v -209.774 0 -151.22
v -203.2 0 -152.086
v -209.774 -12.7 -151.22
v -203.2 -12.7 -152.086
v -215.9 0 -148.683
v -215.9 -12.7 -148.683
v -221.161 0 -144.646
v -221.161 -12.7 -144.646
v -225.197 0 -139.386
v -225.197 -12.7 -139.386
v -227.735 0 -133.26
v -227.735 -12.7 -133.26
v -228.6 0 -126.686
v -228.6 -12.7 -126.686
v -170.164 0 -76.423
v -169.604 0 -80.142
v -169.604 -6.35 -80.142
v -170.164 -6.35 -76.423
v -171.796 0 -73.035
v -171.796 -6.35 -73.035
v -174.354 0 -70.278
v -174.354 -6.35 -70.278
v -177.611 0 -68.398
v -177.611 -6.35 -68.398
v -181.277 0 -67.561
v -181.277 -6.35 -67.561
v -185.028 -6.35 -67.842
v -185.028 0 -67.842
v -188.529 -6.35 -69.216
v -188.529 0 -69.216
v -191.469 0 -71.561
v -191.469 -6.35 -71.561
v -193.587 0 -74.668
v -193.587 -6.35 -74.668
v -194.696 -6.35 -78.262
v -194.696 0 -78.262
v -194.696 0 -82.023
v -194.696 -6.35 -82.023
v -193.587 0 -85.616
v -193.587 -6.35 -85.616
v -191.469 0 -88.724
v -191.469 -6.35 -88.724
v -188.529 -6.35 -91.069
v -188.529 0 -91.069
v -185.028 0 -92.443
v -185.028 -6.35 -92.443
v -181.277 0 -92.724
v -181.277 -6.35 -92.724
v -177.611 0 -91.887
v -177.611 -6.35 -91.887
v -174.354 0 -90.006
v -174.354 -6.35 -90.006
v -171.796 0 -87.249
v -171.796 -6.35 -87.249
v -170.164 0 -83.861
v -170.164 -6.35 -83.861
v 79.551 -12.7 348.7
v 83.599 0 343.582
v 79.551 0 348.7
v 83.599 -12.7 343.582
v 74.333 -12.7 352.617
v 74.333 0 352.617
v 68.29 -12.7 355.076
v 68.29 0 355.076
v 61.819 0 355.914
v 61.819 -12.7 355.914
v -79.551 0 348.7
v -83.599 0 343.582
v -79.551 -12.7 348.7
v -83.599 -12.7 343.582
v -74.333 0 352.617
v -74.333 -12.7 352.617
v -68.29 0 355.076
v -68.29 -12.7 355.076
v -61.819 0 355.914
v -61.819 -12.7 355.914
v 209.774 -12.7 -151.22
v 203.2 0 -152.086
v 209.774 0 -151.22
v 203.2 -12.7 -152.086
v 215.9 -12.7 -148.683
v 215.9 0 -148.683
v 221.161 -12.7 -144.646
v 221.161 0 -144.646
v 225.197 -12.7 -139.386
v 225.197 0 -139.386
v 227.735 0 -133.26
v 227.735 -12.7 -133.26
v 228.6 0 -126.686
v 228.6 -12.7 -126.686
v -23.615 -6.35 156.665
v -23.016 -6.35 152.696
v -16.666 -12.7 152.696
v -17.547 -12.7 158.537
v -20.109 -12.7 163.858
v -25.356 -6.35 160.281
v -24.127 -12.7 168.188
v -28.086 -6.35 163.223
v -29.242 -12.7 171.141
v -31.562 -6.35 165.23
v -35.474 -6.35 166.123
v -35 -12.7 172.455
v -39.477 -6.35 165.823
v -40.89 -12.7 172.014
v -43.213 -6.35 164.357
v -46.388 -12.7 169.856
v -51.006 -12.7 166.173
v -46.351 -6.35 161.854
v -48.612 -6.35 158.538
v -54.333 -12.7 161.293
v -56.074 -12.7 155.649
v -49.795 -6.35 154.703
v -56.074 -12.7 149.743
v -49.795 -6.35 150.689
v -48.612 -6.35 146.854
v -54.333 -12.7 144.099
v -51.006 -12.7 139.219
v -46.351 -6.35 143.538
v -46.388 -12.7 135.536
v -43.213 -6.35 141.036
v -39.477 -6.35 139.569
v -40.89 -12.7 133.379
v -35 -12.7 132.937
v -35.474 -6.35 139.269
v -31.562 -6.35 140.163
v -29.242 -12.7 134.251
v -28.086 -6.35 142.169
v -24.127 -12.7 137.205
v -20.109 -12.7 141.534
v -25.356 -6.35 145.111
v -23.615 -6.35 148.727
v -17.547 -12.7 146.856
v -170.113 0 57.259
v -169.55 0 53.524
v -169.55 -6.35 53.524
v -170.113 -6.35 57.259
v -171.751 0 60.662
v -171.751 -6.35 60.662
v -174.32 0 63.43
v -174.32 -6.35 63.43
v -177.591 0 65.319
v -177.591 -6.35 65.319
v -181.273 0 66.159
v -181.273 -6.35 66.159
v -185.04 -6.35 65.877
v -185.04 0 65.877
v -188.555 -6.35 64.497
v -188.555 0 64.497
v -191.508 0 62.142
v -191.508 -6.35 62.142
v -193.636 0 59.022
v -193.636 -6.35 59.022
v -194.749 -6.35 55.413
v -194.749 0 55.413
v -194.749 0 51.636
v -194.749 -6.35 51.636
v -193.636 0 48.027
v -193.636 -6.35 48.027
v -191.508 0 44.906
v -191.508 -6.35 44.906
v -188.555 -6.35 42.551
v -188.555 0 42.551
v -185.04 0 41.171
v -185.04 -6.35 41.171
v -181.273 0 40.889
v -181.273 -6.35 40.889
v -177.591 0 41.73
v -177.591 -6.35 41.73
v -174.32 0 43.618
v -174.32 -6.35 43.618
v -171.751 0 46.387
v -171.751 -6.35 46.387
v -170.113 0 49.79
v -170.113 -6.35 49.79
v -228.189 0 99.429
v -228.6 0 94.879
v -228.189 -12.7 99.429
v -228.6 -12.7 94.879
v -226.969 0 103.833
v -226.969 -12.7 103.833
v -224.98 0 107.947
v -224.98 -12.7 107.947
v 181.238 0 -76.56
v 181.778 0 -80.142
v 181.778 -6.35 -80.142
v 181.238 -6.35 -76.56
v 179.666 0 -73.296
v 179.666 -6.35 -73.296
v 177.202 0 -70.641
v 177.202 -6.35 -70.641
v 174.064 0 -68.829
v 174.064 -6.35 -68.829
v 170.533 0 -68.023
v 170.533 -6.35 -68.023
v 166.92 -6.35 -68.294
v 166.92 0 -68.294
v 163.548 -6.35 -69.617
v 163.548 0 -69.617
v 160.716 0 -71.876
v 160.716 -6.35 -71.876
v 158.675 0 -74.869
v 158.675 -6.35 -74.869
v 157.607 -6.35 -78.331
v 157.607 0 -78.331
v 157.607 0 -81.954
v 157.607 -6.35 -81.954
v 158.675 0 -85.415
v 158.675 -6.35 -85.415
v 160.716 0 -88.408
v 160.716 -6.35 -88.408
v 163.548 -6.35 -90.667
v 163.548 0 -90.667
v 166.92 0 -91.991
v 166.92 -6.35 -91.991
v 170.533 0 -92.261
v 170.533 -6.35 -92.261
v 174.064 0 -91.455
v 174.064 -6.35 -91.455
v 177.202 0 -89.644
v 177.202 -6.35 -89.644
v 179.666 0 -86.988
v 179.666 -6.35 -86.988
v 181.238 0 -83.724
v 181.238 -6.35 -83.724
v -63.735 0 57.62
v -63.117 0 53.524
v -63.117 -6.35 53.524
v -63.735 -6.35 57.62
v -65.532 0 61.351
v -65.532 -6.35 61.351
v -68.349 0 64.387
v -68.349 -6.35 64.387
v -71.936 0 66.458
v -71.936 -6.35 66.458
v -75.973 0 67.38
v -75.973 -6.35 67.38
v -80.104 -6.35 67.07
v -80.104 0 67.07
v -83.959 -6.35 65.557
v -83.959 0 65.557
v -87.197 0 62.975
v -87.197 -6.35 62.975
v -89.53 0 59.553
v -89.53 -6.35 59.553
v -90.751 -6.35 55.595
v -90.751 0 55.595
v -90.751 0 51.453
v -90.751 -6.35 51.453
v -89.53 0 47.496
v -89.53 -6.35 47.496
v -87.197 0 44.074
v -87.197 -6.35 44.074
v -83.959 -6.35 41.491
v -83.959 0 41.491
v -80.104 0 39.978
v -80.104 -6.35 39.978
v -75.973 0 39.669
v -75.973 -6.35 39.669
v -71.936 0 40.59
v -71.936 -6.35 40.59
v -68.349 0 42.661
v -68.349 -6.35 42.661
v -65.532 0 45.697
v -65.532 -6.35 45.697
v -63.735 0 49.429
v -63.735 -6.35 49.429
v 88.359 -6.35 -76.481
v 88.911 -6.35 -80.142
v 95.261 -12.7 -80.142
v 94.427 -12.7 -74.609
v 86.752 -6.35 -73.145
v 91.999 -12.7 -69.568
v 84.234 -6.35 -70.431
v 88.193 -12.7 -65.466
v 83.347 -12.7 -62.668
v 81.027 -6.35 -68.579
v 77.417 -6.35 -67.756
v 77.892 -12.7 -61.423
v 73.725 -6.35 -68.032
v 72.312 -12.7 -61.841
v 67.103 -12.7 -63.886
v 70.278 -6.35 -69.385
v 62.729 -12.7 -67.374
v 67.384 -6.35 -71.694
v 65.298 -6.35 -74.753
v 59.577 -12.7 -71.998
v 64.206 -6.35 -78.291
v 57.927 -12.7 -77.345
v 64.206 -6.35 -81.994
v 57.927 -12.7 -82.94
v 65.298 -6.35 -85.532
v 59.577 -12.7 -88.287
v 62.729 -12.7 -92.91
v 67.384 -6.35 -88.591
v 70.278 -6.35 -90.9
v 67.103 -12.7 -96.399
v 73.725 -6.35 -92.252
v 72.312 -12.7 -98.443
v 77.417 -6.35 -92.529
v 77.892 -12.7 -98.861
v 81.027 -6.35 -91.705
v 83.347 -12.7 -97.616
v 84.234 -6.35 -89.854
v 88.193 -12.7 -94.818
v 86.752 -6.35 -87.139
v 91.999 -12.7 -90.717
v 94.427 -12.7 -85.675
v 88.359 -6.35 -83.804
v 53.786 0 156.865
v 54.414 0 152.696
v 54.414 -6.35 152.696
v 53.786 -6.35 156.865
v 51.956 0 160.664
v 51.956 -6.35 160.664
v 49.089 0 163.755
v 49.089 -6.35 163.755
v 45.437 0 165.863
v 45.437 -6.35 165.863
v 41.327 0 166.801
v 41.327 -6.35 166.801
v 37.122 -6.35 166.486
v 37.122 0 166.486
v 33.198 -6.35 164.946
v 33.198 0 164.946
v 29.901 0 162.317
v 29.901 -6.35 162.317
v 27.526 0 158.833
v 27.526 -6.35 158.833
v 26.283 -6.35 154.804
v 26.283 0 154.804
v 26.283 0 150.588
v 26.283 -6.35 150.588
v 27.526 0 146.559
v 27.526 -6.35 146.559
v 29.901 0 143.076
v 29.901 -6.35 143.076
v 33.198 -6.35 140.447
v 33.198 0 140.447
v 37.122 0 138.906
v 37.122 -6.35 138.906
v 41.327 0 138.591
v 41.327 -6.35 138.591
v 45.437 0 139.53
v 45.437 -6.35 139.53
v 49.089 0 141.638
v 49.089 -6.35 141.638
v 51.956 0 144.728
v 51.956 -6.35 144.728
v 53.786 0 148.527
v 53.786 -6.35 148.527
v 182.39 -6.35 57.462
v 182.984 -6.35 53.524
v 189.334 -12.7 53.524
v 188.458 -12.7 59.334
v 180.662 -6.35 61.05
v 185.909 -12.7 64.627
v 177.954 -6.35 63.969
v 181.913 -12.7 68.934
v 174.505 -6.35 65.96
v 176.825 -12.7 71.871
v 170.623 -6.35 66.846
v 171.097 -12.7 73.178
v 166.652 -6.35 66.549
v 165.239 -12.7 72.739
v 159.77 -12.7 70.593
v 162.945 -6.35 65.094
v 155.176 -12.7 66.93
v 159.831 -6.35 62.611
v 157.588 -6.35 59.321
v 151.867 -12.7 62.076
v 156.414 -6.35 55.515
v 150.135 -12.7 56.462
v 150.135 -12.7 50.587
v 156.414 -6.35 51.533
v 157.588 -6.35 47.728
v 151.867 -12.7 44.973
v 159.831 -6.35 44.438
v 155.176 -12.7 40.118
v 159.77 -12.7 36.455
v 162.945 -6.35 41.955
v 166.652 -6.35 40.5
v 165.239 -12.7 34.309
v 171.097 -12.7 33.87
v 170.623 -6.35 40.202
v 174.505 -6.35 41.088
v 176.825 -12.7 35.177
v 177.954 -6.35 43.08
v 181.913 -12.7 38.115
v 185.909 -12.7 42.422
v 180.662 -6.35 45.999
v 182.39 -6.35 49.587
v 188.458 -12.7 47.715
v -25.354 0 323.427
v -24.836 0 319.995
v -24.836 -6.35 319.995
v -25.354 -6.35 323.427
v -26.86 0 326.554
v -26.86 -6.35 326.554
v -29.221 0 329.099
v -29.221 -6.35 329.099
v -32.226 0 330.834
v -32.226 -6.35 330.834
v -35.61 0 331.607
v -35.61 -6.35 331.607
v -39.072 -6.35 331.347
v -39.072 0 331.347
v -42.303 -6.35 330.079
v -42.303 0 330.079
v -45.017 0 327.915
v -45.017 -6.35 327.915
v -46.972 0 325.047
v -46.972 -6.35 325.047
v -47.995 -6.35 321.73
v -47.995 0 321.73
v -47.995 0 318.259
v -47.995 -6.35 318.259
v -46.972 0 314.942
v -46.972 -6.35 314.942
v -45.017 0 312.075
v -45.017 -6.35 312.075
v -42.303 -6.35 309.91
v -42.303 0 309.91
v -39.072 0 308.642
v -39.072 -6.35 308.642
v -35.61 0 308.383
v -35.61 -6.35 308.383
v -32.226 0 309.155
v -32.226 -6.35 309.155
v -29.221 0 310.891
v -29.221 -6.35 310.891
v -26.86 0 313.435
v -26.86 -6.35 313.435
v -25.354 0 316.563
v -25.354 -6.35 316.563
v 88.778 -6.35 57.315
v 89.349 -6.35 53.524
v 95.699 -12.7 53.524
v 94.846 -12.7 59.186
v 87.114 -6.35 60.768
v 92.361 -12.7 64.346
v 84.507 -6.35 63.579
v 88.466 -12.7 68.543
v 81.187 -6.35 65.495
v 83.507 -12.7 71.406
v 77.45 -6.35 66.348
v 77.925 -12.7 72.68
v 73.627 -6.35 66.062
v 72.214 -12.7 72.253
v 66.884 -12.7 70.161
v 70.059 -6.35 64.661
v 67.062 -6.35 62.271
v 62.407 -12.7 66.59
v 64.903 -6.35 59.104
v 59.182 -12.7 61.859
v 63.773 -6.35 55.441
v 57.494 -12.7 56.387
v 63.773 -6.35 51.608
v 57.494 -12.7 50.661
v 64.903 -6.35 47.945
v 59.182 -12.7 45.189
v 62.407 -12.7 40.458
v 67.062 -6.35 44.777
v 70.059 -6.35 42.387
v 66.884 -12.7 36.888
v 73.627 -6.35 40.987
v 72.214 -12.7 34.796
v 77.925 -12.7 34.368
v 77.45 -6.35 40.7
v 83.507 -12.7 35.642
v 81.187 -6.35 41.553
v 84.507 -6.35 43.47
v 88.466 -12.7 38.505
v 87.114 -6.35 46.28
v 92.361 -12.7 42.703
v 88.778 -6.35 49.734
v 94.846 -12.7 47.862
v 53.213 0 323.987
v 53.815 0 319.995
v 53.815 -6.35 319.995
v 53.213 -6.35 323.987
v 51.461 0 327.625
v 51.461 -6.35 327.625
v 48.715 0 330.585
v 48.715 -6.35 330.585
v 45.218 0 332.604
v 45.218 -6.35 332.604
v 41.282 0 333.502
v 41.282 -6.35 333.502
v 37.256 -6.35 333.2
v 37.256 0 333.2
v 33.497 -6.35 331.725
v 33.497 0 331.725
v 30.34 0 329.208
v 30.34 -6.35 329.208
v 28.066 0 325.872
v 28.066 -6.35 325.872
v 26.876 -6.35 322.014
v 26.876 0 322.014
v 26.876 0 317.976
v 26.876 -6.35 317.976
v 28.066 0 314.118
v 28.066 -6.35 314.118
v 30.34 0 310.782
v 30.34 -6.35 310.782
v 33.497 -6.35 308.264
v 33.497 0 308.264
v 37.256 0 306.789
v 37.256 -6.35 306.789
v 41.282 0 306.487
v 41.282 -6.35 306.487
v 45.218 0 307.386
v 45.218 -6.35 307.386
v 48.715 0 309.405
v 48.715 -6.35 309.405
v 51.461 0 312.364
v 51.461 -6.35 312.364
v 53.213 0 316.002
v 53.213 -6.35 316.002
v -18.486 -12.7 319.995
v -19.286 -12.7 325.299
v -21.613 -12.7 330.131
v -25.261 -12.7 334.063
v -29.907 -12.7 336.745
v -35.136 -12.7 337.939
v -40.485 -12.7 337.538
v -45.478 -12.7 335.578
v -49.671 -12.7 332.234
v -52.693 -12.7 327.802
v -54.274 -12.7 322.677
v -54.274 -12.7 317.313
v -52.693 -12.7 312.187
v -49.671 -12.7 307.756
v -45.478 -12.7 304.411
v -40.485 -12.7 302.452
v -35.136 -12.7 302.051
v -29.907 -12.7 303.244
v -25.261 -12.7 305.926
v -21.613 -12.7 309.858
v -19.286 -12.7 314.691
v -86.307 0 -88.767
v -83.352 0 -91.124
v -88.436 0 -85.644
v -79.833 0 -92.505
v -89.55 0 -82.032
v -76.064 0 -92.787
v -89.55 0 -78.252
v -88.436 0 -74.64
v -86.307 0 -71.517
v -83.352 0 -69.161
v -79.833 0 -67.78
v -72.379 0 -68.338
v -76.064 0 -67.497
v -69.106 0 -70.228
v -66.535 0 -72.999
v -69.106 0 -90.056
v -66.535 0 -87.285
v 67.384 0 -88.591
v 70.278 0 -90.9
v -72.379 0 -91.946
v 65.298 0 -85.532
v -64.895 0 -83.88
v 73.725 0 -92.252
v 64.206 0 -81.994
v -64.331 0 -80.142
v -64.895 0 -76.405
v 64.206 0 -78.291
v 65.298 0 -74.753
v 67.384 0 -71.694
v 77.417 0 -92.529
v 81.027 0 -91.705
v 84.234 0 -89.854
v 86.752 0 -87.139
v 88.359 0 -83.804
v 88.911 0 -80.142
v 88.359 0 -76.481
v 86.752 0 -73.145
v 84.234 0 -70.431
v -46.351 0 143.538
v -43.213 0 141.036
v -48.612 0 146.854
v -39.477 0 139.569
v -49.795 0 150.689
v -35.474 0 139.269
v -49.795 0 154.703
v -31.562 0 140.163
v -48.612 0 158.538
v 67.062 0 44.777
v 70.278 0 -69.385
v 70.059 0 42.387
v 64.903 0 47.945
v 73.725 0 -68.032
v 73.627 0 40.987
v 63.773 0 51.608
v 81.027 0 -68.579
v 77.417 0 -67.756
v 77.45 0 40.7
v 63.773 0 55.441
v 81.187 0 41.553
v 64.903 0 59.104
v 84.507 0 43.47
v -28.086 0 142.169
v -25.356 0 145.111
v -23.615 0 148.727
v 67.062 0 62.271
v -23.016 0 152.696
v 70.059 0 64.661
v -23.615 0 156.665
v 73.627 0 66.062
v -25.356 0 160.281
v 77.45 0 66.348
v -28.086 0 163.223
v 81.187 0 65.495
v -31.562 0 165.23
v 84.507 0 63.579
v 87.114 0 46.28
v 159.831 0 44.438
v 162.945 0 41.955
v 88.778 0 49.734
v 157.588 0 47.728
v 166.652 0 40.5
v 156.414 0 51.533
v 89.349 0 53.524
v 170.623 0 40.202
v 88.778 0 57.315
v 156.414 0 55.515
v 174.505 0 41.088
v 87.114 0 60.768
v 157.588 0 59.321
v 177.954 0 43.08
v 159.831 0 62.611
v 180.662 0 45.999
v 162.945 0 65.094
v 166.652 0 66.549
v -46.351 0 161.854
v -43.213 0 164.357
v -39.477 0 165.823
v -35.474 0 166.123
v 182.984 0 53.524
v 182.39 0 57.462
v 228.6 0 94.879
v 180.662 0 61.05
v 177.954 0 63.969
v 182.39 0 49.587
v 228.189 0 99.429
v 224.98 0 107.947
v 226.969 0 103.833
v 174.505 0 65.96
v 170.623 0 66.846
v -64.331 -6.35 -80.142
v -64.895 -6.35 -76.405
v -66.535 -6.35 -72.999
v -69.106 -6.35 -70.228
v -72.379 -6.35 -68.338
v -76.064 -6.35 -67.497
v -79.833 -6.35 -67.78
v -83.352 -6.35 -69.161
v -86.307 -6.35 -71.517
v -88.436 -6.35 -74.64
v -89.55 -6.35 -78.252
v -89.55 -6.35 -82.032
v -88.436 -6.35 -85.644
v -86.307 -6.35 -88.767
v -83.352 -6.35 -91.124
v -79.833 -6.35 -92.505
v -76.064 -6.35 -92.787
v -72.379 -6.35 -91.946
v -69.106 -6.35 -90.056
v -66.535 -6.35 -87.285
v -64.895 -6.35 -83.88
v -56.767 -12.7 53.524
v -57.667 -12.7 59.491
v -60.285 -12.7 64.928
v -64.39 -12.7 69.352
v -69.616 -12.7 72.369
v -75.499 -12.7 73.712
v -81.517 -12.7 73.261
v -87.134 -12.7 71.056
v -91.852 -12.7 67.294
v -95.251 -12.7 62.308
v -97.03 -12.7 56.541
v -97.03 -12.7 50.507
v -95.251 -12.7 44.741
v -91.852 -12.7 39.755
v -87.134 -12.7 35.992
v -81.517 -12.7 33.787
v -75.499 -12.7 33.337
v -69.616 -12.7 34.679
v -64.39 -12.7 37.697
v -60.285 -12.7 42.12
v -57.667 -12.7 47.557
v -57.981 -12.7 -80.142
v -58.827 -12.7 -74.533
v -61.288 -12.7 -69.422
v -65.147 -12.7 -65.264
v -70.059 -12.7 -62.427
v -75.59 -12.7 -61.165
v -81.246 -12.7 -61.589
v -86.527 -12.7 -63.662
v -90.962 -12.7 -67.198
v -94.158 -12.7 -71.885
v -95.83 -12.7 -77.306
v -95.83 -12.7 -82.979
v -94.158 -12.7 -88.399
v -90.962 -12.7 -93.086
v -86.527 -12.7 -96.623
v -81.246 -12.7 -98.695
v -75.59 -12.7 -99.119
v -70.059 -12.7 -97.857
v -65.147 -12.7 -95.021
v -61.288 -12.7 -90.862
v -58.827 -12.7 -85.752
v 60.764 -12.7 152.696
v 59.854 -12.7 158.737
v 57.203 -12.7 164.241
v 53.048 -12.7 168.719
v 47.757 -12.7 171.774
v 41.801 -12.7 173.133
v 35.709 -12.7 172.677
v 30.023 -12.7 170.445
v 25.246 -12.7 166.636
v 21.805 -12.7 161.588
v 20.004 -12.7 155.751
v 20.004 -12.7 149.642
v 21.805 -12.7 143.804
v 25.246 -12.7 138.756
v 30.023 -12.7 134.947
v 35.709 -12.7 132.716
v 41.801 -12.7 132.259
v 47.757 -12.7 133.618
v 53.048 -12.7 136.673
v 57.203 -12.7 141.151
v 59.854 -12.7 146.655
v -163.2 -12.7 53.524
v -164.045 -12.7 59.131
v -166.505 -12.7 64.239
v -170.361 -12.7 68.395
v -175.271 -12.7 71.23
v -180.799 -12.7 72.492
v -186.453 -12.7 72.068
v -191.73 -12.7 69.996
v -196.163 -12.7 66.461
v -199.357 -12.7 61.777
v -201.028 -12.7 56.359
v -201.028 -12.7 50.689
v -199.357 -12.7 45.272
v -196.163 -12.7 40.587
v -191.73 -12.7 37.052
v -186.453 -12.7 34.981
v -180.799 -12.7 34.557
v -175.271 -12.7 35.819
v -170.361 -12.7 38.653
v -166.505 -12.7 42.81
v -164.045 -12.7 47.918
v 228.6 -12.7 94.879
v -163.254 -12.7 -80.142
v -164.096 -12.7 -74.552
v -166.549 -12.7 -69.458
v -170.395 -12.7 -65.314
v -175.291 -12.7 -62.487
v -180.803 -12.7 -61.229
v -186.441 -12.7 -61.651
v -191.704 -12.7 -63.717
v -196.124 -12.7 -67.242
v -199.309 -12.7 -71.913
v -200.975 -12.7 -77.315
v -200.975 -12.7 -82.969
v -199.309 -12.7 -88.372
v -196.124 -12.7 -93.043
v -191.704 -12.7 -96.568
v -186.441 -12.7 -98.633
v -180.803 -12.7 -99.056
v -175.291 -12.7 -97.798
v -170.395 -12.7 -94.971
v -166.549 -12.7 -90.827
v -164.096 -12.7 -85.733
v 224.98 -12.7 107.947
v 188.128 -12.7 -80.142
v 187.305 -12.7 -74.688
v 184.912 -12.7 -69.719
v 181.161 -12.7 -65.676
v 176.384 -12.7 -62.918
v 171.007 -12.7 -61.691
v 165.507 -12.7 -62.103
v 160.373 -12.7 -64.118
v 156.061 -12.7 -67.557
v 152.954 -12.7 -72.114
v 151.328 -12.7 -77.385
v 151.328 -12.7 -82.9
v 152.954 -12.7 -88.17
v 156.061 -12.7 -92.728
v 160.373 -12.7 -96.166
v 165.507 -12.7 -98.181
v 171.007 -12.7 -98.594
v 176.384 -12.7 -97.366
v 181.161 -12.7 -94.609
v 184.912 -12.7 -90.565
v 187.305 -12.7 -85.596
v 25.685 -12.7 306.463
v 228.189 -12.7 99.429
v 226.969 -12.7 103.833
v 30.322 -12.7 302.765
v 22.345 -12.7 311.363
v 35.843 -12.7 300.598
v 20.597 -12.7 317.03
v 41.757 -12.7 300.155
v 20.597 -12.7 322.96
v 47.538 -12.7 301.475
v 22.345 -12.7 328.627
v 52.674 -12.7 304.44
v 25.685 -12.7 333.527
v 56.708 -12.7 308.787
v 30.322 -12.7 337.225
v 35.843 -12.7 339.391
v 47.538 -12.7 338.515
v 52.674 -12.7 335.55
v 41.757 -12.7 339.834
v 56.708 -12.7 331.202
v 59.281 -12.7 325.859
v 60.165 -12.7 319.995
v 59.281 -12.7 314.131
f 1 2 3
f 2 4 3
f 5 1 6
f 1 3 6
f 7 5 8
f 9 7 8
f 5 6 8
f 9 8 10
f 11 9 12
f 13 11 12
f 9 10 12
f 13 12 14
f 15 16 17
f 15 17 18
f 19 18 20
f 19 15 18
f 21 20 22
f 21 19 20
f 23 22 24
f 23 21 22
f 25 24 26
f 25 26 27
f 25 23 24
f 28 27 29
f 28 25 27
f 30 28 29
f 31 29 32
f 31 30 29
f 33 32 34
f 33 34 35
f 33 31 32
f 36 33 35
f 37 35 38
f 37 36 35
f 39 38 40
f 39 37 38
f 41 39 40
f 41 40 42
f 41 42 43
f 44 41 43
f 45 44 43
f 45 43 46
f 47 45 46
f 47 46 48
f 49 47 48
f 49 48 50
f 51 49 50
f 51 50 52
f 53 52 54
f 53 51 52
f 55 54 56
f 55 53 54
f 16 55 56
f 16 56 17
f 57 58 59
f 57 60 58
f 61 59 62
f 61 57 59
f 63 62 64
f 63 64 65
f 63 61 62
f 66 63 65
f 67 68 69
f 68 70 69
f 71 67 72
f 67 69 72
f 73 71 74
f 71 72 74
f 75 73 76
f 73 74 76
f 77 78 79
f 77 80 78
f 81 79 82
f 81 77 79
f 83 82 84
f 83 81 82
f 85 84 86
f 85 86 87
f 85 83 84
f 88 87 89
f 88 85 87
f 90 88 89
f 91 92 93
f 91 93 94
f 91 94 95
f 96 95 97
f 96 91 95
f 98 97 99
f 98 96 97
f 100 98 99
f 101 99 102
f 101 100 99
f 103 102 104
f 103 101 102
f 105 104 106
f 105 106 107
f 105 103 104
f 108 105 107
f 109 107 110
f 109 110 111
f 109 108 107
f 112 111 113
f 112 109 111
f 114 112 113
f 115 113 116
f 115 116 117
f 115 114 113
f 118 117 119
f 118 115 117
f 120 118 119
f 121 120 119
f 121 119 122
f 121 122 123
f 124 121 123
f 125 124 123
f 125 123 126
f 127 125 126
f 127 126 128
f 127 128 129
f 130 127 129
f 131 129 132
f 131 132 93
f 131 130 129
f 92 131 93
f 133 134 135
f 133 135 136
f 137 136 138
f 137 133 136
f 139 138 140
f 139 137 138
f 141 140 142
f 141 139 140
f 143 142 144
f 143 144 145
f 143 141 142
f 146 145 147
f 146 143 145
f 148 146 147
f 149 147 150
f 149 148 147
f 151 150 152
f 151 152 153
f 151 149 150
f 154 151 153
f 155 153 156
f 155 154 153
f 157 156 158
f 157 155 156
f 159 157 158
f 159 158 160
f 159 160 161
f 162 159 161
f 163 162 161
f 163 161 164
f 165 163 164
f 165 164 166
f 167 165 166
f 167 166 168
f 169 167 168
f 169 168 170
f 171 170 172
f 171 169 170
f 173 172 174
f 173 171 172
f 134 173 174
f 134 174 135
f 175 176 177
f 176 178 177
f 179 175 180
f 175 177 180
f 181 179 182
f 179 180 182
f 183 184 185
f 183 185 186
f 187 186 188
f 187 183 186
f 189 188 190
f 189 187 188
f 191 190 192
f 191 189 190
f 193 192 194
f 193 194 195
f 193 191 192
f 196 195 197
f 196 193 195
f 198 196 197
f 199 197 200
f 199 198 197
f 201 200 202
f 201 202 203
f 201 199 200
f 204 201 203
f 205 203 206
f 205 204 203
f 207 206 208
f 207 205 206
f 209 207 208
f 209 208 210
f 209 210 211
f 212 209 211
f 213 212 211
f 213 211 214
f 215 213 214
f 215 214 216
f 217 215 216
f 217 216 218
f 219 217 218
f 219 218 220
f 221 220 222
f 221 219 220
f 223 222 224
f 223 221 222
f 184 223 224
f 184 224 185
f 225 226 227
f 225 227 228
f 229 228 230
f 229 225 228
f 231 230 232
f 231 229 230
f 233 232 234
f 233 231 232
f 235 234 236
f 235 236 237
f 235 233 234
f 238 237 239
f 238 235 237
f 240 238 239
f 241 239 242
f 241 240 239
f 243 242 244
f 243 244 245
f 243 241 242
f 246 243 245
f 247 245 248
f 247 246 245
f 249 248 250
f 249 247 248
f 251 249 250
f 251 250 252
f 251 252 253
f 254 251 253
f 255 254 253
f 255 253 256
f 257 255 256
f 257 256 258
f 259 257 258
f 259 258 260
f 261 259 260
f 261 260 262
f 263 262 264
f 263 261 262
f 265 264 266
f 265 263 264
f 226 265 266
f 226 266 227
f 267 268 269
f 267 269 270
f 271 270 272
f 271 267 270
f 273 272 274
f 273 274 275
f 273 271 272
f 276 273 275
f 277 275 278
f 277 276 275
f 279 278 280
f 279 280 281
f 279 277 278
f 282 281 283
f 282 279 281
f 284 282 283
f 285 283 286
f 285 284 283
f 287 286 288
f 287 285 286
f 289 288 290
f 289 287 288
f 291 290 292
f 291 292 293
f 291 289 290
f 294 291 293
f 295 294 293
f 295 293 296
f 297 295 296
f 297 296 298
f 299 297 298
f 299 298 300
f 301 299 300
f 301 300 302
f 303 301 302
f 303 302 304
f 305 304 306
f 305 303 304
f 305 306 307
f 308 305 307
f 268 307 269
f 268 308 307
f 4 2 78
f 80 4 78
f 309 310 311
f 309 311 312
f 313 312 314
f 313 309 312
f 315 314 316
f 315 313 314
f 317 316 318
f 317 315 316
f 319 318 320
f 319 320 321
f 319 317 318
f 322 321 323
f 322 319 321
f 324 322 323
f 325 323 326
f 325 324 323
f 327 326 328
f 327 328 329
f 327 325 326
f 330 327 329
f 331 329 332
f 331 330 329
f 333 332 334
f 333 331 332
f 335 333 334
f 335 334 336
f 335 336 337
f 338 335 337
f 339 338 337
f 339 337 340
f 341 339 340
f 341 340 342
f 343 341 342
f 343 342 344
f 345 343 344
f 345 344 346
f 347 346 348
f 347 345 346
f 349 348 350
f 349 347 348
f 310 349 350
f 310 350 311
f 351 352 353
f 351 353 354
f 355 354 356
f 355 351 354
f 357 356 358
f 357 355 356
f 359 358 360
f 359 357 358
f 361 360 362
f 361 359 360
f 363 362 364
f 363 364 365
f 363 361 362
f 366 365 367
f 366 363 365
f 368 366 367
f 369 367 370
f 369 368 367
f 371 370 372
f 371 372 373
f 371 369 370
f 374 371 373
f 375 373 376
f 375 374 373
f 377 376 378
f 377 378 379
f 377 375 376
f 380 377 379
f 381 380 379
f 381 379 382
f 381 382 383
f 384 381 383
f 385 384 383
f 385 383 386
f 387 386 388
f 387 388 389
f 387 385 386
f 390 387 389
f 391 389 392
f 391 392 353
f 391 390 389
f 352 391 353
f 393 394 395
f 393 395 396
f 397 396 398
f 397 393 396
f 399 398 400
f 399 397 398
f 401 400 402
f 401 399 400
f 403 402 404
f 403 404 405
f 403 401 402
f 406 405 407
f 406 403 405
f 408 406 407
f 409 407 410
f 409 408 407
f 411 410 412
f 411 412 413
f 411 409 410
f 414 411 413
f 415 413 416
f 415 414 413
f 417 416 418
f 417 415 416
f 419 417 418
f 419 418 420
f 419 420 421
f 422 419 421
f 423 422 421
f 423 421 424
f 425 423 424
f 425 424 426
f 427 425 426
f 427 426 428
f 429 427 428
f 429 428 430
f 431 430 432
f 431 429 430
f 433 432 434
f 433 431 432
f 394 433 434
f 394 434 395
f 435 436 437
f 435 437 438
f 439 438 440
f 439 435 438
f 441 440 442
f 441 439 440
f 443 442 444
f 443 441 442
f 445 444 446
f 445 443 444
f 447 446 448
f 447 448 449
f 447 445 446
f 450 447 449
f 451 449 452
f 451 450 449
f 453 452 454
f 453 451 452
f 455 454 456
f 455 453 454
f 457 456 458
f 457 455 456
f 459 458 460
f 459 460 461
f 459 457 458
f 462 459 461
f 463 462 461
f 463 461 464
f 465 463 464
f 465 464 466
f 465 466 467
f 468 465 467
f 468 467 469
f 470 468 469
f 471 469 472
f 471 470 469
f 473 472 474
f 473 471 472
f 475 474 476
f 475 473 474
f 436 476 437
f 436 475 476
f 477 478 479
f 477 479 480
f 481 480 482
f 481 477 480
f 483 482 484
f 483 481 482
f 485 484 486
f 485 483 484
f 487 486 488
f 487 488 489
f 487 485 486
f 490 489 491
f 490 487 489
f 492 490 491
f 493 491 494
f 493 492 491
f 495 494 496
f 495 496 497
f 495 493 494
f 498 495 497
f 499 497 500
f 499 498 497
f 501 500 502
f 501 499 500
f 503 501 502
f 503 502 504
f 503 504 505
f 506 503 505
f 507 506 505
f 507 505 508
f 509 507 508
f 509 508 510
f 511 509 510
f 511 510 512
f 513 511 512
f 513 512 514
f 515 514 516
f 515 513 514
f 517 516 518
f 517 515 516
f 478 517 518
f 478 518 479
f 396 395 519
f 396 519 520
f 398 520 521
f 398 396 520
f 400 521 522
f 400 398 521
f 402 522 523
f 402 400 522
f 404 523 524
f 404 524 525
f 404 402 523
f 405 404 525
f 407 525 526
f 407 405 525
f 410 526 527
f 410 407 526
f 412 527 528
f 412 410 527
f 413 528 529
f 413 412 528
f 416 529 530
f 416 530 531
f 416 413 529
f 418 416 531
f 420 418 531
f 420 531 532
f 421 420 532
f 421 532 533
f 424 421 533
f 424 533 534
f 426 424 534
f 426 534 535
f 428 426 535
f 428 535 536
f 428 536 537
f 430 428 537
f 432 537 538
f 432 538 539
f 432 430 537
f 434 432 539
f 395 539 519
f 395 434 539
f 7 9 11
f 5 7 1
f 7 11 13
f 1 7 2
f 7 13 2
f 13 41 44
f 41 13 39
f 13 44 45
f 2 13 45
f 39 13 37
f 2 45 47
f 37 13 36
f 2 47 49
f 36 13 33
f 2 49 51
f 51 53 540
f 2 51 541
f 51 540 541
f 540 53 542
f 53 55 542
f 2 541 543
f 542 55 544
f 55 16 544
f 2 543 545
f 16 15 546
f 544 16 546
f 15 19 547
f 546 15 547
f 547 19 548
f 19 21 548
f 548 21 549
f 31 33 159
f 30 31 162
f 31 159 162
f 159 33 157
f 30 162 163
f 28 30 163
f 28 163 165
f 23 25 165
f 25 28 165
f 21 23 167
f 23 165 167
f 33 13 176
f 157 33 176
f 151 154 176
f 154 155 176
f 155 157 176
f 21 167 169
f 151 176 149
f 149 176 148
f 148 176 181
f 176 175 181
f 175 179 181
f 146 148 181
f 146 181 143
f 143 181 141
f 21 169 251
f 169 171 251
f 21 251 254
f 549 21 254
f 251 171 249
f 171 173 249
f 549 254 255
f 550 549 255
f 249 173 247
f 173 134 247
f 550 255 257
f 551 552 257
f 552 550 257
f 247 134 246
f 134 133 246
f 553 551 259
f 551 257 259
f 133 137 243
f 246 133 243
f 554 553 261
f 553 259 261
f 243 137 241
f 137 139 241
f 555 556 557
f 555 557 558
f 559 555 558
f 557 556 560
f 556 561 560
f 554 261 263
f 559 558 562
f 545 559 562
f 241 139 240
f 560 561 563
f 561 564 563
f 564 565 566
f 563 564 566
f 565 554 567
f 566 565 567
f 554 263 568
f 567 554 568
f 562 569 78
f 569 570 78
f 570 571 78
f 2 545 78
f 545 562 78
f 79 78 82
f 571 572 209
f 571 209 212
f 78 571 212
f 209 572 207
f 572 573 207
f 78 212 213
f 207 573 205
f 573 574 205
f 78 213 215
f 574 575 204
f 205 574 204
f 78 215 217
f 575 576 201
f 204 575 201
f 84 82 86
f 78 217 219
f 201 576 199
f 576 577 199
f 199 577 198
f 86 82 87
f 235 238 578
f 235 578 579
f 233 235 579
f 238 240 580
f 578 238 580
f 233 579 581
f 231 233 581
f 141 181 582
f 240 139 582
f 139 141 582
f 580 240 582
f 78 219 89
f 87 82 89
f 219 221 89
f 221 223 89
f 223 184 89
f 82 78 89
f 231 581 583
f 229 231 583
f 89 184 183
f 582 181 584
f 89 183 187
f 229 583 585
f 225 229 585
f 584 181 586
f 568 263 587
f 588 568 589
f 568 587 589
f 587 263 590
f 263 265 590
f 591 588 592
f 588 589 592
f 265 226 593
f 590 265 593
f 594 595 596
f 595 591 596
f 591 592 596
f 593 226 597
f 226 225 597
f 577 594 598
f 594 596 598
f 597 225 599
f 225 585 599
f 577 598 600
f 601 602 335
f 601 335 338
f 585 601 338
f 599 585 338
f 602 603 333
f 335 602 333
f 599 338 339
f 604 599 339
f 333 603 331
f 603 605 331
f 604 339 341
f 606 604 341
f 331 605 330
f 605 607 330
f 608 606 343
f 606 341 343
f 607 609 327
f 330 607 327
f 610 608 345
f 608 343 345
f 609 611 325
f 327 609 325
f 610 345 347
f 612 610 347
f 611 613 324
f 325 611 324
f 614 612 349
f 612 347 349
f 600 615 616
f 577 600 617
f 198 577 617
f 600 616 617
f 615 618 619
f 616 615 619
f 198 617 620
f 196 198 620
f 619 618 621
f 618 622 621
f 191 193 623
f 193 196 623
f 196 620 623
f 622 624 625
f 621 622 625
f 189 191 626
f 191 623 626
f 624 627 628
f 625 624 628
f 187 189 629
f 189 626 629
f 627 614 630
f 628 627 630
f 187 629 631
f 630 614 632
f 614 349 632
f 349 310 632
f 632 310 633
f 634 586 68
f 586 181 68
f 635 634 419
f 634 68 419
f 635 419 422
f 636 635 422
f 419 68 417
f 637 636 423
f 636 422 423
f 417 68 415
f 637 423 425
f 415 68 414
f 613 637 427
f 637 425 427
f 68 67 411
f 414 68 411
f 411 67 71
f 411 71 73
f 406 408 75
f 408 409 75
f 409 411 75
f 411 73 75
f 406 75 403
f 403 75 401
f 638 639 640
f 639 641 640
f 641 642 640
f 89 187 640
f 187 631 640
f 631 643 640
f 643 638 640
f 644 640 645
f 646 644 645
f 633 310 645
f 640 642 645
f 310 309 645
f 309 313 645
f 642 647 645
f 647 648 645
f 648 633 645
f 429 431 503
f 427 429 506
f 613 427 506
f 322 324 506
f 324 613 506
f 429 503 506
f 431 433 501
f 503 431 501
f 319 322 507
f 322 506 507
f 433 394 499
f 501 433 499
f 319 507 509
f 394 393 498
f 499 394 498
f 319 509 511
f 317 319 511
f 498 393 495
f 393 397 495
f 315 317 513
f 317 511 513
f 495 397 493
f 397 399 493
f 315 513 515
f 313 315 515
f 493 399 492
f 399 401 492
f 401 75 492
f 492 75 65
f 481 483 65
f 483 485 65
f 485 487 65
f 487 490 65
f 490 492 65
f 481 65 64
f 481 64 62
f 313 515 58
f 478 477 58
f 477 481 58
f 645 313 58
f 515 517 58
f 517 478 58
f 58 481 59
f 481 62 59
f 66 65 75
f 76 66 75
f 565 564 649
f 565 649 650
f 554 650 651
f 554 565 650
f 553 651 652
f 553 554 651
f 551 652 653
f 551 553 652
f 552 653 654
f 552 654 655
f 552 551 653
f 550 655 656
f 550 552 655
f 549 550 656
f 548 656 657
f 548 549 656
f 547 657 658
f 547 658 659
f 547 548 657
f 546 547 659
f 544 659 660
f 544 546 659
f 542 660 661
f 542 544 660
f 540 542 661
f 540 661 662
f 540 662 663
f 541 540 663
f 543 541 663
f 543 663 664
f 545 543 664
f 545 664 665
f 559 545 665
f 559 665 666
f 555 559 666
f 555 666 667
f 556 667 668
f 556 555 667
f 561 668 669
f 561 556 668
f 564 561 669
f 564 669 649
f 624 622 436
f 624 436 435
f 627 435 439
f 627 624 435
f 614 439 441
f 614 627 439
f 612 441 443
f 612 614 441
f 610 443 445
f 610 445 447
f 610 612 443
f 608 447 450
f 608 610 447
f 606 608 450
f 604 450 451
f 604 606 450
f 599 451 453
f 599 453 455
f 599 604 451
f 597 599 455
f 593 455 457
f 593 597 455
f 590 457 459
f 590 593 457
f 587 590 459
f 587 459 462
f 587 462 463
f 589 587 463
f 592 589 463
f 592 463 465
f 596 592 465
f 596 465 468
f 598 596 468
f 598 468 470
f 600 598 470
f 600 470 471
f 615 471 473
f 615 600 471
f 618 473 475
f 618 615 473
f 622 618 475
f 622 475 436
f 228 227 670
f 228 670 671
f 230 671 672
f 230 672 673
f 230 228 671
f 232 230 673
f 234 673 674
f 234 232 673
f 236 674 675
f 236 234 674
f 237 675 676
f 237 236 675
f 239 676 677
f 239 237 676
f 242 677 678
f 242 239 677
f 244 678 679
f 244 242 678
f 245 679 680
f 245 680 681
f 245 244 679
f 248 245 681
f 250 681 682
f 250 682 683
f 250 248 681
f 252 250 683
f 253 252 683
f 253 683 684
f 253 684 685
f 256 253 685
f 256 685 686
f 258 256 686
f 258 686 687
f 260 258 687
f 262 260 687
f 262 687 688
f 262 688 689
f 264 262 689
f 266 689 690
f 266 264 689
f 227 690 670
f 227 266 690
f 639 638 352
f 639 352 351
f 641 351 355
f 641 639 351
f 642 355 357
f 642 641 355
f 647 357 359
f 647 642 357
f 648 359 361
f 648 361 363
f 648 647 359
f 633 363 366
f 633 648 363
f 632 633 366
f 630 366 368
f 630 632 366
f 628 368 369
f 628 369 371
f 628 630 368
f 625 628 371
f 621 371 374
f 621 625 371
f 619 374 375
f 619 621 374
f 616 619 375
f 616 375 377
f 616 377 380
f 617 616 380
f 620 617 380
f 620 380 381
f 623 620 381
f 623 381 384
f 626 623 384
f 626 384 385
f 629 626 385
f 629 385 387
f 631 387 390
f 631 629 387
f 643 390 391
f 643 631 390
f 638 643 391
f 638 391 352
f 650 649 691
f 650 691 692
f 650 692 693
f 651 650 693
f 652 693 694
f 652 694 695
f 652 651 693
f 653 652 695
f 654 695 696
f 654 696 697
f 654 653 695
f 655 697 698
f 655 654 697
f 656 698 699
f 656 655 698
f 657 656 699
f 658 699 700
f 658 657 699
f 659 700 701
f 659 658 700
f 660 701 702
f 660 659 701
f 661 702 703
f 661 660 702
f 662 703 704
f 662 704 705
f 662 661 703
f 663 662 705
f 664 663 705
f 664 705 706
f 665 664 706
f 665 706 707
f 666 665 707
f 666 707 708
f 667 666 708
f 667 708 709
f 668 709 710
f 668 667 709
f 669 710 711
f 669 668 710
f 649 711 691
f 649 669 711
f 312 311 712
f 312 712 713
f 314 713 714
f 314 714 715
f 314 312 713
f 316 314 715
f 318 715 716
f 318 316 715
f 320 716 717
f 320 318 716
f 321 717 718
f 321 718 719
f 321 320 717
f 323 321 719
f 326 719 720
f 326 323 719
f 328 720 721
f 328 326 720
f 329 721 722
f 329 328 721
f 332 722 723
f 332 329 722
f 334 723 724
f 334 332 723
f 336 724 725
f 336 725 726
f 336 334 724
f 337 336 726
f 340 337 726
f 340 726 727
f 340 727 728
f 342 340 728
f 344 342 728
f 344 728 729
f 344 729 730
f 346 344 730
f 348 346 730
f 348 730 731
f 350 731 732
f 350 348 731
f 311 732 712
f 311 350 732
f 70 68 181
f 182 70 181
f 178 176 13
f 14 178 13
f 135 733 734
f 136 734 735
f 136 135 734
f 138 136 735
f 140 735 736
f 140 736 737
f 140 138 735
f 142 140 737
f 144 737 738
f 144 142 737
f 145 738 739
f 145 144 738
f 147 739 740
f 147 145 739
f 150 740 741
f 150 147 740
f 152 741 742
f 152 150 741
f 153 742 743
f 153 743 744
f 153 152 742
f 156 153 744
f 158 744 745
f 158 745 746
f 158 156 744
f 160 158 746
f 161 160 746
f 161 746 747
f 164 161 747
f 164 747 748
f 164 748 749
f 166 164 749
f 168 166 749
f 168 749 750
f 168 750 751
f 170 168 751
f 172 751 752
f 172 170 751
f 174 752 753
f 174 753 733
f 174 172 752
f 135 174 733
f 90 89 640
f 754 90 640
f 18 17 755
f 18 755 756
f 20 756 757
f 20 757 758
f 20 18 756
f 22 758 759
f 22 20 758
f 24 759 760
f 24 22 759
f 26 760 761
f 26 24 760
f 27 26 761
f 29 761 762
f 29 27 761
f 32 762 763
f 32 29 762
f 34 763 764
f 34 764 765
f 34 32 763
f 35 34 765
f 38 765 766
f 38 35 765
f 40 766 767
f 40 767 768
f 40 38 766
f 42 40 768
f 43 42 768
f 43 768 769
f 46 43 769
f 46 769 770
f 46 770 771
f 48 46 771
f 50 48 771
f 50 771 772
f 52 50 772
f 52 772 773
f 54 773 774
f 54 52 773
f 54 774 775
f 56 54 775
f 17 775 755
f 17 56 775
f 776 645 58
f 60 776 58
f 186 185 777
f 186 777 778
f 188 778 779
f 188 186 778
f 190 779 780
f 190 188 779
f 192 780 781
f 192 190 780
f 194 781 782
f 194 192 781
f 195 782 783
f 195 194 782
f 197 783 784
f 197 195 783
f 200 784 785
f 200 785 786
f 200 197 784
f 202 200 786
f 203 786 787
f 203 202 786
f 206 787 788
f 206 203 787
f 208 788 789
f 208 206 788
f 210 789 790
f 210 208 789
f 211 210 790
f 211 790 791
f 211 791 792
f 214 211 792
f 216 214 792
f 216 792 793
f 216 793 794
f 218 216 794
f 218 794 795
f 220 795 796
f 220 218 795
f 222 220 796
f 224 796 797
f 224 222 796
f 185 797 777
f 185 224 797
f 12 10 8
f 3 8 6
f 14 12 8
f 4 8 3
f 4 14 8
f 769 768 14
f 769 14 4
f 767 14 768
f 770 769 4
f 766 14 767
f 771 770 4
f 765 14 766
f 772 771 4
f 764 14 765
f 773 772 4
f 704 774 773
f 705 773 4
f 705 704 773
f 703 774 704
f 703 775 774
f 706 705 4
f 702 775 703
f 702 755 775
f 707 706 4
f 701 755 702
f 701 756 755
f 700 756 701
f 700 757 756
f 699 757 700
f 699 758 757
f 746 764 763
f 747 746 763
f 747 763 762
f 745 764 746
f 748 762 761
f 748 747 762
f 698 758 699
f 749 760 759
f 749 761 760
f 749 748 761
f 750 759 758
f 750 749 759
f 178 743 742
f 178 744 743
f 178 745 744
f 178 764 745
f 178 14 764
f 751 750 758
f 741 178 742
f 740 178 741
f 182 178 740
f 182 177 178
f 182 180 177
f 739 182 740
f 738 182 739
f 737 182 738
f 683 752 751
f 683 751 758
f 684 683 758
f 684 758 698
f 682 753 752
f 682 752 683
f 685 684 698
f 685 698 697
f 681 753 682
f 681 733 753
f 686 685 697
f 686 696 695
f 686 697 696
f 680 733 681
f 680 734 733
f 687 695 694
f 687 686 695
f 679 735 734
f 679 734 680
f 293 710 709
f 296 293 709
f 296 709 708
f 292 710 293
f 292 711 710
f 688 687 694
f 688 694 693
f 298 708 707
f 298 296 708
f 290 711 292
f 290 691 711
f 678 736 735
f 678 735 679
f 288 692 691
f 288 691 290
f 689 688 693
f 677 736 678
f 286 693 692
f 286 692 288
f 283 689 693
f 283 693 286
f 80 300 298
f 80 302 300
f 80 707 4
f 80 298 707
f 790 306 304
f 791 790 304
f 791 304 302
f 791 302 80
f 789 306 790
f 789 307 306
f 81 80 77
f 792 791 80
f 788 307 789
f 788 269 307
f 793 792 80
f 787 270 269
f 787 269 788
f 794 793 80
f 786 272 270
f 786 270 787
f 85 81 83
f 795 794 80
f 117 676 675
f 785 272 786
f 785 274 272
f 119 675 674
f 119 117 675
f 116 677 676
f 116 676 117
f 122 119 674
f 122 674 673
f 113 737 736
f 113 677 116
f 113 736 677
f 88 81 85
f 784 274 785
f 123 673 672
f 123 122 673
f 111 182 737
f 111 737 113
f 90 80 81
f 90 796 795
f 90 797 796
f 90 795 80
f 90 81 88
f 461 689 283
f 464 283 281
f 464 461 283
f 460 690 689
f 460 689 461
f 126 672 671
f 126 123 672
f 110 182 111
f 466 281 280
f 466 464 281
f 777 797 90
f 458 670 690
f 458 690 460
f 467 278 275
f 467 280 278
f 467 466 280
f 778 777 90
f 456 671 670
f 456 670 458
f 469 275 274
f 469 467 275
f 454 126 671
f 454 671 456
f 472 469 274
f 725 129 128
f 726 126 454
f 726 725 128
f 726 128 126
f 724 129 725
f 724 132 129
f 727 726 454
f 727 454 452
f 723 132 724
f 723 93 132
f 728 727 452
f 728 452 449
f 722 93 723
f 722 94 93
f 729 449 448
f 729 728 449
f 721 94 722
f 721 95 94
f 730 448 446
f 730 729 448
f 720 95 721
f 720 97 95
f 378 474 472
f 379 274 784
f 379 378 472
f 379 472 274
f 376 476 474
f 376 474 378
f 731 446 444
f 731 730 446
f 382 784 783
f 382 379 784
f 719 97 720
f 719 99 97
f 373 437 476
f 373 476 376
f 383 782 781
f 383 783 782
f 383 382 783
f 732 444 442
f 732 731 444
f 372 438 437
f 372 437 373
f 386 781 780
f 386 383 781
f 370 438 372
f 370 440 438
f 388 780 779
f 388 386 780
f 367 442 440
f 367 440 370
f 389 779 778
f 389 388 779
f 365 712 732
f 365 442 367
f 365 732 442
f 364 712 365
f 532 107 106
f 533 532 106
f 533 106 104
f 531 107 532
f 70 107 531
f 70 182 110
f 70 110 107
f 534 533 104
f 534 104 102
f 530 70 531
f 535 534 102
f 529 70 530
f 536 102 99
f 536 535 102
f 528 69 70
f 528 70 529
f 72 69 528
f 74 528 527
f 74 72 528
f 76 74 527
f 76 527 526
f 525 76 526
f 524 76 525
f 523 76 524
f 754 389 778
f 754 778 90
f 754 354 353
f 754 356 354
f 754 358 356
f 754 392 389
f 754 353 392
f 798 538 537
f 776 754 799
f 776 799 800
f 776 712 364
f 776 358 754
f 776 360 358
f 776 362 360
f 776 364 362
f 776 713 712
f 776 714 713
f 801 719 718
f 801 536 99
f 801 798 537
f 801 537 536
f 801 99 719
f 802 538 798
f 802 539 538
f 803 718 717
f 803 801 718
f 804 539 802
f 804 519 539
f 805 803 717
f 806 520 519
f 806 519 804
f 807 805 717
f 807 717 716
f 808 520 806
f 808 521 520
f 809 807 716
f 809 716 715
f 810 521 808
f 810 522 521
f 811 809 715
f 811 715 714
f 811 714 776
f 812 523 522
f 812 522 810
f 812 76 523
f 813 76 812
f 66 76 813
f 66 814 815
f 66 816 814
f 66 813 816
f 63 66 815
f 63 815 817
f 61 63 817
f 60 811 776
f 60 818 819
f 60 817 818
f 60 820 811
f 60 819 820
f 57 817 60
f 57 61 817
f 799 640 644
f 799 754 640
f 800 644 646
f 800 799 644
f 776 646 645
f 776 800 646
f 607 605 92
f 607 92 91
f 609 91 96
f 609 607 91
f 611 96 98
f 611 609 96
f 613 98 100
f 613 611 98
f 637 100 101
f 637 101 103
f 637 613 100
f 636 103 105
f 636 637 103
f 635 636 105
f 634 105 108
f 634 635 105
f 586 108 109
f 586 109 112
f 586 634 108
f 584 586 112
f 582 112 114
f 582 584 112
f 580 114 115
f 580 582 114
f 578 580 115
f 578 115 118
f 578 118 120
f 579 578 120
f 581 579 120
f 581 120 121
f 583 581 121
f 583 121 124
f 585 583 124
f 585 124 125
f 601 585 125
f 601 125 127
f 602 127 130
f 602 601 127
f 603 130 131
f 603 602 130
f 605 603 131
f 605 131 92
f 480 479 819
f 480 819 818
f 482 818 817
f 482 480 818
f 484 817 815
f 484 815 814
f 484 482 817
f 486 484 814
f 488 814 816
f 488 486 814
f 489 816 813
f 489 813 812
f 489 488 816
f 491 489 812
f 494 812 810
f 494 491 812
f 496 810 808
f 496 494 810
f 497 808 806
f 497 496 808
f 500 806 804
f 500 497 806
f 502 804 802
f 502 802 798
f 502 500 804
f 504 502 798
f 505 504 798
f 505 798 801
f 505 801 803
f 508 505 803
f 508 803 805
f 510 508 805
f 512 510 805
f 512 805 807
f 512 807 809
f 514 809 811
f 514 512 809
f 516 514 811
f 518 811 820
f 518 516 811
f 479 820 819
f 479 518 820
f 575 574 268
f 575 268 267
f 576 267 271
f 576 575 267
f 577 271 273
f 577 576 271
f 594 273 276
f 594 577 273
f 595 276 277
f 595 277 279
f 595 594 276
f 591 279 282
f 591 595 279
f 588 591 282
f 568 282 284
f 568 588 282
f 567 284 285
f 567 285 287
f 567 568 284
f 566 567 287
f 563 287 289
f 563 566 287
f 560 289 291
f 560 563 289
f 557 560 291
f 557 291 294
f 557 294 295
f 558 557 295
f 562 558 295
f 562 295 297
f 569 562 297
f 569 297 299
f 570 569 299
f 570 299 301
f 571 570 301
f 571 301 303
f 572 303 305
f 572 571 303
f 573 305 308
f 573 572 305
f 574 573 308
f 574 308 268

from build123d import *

# Parameters (mm, degrees)
F0_R     = 12.6166
F0_R_2   = 12.680328
F0_R_3   = 12.670482
F0_R_4   = 13.894295
F0_R_5   = 12.421427
F0_R_6   = 12.153085
F0_R_7   = 12.859931
F0_R_8   = 13.359293
F0_R_9   = 13.464332
F0_R_10  = 11.644387
F0_R_11  = 14.14438
F0_R_12  = 13.545297
F1_DEPTH = 12.7
F2_R     = 25.4
F3_SIZE  = 6.35


with BuildPart() as f1:
    # F0 (on Front) → F1 (new body)
    with BuildSketch(Plane.XZ):
        Polygon((-228.6, -152.085962), (228.6, -152.085962), (228.6, 101.914038), (76.2, 355.914038), (-76.2, 355.914038), (-228.6, 101.914038), align=None)
        with Locations((-182.22025, -80.14226)):
            Circle(F0_R, mode=Mode.SUBTRACT)
        with Locations((-77.011786, -80.14226)):
            Circle(F0_R_2, mode=Mode.SUBTRACT)
        with Locations((-182.22025, 53.524222)):
            Circle(F0_R_3, mode=Mode.SUBTRACT)
        with Locations((-77.011786, 53.524222)):
            Circle(F0_R_4, mode=Mode.SUBTRACT)
        with Locations((76.489076, -80.14226)):
            Circle(F0_R_5, mode=Mode.SUBTRACT)
        with Locations((169.624433, -80.14226)):
            Circle(F0_R_6, mode=Mode.SUBTRACT)
        with Locations((76.489076, 53.524222)):
            Circle(F0_R_7, mode=Mode.SUBTRACT)
        with Locations((169.624433, 53.524222)):
            Circle(F0_R_8, mode=Mode.SUBTRACT)
        with Locations((-36.480658, 152.696133)):
            Circle(F0_R_9, mode=Mode.SUBTRACT)
        with Locations((-36.480658, 319.994807)):
            Circle(F0_R_10, mode=Mode.SUBTRACT)
        with Locations((40.269773, 152.696133)):
            Circle(F0_R_11, mode=Mode.SUBTRACT)
        with Locations((40.269773, 319.994807)):
            Circle(F0_R_12, mode=Mode.SUBTRACT)
    extrude(amount=F1_DEPTH)

    # F2
    f2_edges = [f1.edges().sort_by_distance(p)[0] for p in [
        (76.2, -6.35, 355.914038),
        (-76.2, -6.35, 355.914038),
        (228.6, -6.35, 101.914038),
        (228.6, -6.35, -152.085962),
        (-228.6, -6.35, -152.085962),
        (-228.6, -6.35, 101.914038),
    ]]
    fillet(f2_edges, radius=F2_R)

    # F3
    f3_edges = [f1.edges().sort_by_distance(p)[0] for p in [
        (26.724477, -12.7, 319.994807),
        (-48.125045, -12.7, 319.994807),
        (-49.94499, -12.7, 152.696133),
        (26.125393, -12.7, 152.696133),
        (-90.906081, -12.7, 53.524222),
        (-194.890732, -12.7, 53.524222),
        (63.629145, -12.7, 53.524222),
        (156.26514, -12.7, 53.524222),
        (157.471348, -12.7, -80.14226),
        (64.067649, -12.7, -80.14226),
        (-89.692114, -12.7, -80.14226),
        (-194.83685, -12.7, -80.14226),
    ]]
    chamfer(f3_edges, length=F3_SIZE)


solid = f1.part
